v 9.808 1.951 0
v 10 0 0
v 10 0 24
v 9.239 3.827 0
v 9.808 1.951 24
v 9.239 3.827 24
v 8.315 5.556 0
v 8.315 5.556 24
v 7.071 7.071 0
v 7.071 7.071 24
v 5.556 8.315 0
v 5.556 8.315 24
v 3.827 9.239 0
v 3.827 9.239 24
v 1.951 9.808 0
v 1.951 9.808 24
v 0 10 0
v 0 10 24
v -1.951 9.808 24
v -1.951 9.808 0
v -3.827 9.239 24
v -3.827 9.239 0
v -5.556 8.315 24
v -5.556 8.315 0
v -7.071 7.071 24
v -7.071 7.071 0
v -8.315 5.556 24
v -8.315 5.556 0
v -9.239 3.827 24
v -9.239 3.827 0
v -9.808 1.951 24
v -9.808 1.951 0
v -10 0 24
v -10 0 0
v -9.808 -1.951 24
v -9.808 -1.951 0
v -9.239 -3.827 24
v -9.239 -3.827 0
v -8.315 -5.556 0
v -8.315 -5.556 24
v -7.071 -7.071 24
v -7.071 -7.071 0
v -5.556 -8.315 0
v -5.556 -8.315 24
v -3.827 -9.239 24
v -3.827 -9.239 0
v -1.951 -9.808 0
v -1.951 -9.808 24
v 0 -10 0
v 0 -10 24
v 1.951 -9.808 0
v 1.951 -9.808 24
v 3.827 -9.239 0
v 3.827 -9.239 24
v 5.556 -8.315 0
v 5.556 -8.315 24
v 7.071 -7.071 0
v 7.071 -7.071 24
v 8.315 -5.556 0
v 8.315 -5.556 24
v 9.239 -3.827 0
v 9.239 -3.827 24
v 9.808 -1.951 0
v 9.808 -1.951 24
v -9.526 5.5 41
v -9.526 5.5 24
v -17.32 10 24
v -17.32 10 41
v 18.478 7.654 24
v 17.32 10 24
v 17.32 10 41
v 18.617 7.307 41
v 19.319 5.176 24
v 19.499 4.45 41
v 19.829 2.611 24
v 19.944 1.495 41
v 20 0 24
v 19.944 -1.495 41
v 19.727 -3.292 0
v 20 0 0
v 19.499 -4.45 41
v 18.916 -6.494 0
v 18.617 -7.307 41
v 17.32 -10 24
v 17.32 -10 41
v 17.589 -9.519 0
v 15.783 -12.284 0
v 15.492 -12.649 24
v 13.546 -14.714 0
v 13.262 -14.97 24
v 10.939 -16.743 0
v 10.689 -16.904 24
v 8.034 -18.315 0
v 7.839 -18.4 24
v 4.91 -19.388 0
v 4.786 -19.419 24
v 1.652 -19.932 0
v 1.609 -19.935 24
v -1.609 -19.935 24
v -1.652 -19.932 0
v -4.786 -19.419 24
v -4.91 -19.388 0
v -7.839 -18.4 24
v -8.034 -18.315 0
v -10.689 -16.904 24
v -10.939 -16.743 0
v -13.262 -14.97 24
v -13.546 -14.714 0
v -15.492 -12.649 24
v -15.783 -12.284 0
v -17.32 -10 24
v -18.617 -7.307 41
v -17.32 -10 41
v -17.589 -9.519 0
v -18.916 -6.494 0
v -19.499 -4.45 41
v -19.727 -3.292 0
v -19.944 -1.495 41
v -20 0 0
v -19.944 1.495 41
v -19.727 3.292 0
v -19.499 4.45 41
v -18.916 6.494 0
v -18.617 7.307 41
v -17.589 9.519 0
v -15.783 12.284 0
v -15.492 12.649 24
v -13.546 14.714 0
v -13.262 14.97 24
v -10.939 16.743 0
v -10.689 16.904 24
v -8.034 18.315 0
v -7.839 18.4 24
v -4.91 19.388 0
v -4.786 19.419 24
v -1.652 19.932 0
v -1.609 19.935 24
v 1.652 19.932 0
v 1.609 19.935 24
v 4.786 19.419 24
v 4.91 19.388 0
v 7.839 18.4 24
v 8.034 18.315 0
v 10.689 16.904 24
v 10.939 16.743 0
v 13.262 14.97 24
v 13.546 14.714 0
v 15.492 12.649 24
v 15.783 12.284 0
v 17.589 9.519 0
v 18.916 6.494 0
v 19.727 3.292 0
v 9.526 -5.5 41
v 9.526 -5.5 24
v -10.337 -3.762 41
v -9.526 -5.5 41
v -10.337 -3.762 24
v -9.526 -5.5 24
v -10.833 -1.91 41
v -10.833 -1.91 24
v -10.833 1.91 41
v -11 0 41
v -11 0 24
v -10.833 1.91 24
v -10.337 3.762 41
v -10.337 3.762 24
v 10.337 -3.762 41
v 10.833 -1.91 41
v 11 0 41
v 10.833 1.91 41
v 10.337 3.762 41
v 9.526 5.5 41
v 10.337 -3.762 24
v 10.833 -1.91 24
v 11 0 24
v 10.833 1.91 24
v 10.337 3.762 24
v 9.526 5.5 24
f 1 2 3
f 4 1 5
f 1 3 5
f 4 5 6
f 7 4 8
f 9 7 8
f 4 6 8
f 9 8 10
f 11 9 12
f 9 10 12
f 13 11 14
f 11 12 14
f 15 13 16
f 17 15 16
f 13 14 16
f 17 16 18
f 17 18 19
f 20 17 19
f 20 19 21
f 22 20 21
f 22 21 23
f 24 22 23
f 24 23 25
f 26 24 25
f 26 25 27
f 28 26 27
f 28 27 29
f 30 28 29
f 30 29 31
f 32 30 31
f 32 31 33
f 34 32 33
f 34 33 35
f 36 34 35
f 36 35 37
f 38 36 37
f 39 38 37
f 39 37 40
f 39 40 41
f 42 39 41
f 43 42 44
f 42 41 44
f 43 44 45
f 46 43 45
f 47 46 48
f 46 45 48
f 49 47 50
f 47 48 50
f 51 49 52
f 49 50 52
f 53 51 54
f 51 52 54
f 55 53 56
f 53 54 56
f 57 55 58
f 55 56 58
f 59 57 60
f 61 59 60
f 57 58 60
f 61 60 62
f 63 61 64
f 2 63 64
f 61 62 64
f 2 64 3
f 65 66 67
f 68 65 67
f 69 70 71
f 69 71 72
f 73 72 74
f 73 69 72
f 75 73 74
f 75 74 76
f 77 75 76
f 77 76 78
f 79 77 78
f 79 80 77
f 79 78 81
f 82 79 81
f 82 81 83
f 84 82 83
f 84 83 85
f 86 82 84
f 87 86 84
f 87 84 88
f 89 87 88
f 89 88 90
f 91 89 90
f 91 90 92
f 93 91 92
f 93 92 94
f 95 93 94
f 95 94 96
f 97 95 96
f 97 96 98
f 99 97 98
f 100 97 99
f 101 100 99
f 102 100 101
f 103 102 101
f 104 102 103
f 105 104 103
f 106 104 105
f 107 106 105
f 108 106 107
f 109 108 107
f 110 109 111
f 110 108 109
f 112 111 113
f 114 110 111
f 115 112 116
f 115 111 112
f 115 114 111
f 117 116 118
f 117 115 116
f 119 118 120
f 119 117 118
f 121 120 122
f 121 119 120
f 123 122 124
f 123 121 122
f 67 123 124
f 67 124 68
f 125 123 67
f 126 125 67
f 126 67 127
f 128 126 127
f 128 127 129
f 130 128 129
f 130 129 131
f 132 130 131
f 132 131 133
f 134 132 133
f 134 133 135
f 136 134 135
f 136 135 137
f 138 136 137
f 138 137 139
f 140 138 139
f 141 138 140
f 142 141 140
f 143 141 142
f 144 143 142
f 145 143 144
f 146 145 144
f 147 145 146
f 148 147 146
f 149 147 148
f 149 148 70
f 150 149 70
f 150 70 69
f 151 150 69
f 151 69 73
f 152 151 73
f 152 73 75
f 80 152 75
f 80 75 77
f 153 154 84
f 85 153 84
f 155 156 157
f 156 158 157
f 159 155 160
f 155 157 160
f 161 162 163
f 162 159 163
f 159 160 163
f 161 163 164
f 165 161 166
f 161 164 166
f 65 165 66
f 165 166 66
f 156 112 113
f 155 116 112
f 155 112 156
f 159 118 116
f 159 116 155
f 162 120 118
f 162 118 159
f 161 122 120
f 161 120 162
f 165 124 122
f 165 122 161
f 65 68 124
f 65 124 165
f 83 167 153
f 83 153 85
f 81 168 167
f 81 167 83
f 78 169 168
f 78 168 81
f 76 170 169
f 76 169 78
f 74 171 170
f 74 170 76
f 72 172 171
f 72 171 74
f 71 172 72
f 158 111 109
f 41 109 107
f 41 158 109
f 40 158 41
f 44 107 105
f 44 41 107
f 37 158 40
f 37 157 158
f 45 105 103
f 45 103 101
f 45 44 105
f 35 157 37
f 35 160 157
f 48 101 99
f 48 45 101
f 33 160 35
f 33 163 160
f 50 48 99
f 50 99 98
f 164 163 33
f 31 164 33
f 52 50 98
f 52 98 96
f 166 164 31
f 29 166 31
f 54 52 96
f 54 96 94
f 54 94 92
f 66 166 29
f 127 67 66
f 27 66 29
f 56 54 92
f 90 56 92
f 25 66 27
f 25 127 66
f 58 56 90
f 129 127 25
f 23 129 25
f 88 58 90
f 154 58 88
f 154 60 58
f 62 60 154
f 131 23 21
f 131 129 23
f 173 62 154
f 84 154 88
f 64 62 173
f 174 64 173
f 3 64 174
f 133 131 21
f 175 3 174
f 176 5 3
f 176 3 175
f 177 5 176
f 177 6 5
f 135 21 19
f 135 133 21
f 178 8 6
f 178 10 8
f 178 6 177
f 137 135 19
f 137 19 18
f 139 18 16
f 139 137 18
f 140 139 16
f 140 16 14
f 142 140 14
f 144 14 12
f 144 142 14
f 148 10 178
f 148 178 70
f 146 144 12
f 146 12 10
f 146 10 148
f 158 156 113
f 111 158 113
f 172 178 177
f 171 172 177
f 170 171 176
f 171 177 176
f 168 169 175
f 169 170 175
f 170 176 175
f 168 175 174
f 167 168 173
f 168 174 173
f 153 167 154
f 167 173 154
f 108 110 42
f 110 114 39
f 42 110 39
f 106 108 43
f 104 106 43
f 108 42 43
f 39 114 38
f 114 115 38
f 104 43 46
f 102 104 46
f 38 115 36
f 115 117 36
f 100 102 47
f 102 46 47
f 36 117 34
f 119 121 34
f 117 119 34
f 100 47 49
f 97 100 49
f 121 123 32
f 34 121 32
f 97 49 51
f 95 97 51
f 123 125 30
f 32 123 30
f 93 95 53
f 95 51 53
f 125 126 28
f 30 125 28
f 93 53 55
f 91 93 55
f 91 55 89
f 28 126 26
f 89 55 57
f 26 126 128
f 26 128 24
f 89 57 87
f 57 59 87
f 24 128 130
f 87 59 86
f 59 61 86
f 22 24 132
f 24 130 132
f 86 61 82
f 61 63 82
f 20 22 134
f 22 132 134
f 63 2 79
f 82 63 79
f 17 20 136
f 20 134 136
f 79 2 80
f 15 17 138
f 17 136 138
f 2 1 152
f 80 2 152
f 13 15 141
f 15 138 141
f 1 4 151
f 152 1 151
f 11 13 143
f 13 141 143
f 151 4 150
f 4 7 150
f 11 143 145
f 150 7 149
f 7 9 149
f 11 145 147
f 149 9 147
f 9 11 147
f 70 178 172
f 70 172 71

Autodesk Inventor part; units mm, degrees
ref_plane "YZ Plane" through (0, 0, 0) normal (1, 0, 0) x (0, 1, 0)
ref_plane "XZ Plane" through (0, 0, 0) normal (0, 1, 0) x (-1, 0, 0)
ref_plane "XY Plane" through (0, 0, 0) normal (0, 0, 1) x (1, 0, 0)
sketch "Sketch1" plane through (0, 0, 0) normal (0, 0, 1) x (1, 0, 0)
  circle A0 centre (0, 0) radius 20
  dimension "d0" = 40
extrude "Extrusion1" add sketch "Sketch1" along normal blind 24
sketch "Sketch2" plane through (0, 0, 24) normal (0, 0, 1) x (1, 0, 0)
  arc A0 (-9.5263, 5.5) -> (-9.5263, -5.5) centre (0, 0) ccw
  line L0 (-9.5263, 5.5) -> (-17.3205, 10)
  circle A1 centre (0, 0) radius 20 projected
  line L1 (0, 0) -> (20, 0) construction
  line L2 (-9.5263, -5.5) -> (-17.3205, -10)
  line L3 (0, 0) -> (20, 0) construction
  line L4 (0, 0) -> (0, 20) construction
  arc A2 (9.5263, -5.5) -> (9.5263, 5.5) centre (0, 0) ccw
  line L5 (9.5263, 5.5) -> (17.3205, 10)
  line L6 (9.5263, -5.5) -> (17.3205, -10)
  dimension "d3" = 22
  dimension "d4" = 150
  dimension "d5" = 150
extrude "Extrusion2" add sketch "Sketch2" along normal blind 17 contours A0 L2 A1 L0 | A1 L6 A2 L5
sketch "Sketch3" plane through (0, 0, 24) normal (0, 0, 1) x (1, 0, 0)
  circle A0 centre (0, 0) radius 10
  dimension "d8" = 20
extrude "Extrusion3" cut sketch "Sketch3" against normal through all
properties part number "22MM JAW"
